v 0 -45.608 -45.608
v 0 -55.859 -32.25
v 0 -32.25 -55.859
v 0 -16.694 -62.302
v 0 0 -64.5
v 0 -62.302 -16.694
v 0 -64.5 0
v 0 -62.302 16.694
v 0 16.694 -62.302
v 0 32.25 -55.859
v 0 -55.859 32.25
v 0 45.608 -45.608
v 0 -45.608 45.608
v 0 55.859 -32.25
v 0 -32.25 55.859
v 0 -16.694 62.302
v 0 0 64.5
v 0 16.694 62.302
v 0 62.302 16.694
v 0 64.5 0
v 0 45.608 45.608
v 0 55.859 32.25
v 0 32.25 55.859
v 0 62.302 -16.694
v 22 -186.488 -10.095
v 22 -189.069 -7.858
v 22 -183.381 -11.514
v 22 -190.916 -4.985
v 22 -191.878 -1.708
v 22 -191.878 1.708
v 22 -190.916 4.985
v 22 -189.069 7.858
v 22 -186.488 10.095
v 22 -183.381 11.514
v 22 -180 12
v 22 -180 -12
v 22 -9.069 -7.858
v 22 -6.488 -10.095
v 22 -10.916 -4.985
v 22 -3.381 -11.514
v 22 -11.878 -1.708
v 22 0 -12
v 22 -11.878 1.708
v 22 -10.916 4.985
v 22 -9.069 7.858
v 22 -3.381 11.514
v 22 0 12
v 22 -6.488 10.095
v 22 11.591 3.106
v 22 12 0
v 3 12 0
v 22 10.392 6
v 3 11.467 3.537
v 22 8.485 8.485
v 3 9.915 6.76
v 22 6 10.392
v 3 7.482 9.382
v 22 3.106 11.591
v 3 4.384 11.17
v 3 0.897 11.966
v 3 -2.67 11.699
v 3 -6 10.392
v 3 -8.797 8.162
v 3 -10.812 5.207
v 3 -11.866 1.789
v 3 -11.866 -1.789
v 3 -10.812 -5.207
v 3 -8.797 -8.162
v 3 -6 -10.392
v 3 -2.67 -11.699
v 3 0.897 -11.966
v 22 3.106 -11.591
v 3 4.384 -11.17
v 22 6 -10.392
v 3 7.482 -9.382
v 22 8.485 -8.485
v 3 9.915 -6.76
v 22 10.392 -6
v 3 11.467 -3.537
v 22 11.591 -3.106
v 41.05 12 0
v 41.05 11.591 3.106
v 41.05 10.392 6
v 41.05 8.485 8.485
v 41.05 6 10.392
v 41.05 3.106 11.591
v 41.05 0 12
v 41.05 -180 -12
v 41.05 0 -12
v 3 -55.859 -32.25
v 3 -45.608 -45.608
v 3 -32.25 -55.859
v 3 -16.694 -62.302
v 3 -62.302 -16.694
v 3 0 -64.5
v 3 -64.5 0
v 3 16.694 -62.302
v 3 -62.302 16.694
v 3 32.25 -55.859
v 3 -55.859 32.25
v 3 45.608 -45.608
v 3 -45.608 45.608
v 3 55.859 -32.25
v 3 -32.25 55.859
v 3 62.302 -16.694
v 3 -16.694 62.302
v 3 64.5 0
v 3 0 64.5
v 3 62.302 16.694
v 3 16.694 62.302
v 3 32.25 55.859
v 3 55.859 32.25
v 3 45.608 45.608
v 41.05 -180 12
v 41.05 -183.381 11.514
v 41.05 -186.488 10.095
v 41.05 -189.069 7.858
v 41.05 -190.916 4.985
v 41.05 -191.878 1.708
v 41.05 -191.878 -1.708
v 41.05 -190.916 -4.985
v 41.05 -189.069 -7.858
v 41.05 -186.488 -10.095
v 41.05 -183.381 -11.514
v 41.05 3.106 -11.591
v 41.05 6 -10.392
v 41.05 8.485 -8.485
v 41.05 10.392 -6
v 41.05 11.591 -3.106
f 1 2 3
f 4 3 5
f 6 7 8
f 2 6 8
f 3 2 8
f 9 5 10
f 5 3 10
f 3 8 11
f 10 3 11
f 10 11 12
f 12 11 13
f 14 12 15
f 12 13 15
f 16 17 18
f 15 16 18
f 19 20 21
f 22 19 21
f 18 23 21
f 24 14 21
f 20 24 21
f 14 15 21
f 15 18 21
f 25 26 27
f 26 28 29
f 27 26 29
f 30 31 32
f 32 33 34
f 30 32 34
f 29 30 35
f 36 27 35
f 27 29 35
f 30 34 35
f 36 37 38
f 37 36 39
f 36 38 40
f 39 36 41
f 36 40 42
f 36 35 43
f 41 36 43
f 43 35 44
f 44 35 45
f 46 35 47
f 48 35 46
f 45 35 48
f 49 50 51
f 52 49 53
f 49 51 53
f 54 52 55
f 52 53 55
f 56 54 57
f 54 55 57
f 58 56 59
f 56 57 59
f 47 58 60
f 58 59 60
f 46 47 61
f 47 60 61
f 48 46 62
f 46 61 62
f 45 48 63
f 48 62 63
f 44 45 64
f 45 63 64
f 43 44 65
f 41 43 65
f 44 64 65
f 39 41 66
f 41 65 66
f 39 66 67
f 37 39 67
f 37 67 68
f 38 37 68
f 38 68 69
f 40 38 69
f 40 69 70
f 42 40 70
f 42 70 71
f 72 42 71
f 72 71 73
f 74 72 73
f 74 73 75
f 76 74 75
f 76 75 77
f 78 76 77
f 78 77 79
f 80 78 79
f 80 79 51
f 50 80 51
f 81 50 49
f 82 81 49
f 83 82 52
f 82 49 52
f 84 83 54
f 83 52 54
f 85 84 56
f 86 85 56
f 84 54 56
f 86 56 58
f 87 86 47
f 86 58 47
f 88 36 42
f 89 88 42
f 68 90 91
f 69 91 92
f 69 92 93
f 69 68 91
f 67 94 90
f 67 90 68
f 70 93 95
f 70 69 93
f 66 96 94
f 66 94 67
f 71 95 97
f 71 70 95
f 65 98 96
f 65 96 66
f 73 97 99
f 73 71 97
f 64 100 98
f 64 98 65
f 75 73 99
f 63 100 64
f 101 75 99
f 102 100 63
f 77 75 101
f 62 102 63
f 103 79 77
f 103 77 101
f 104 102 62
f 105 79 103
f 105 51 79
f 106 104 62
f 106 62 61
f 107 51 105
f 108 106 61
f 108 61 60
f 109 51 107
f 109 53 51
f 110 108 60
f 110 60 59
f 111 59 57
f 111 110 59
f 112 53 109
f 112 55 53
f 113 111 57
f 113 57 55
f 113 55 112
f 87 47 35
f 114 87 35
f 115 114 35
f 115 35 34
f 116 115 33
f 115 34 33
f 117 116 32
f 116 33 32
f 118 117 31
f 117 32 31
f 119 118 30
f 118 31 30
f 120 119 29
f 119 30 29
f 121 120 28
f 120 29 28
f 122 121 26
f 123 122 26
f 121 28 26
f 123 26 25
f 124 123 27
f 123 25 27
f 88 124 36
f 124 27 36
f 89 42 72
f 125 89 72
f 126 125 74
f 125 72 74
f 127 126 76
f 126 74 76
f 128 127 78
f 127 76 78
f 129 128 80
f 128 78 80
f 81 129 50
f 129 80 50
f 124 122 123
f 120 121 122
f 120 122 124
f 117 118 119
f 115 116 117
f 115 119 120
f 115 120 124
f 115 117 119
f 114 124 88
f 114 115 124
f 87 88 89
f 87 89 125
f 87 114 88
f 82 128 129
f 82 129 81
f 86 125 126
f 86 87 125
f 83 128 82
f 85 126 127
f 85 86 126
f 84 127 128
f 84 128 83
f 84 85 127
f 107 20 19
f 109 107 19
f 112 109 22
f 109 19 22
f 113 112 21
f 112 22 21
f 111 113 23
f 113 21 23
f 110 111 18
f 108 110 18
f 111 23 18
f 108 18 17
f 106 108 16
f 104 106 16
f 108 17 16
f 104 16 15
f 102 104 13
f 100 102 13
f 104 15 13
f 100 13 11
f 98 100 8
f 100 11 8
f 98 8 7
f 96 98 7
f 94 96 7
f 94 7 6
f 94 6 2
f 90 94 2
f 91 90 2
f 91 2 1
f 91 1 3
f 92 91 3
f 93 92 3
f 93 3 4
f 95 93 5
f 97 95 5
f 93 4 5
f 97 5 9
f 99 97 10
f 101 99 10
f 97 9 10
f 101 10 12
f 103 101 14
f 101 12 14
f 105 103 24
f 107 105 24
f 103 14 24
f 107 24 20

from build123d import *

# Parameters (mm, degrees)
F0_R     = 64.5
F1_DEPTH = 3
F2_R     = 12
F3_DEPTH = 19
F5_DEPTH = 19.05


with BuildPart() as f1:
    # F0 (on Right) → F1 (new body)
    with BuildSketch(Plane.YZ):
        Circle(F0_R)
    extrude(amount=F1_DEPTH)

    # F2 (on face) → F3 (join)
    with BuildSketch(Plane.YZ.offset(3)):
        Circle(F2_R)
    extrude(amount=F3_DEPTH)

    # F4 (on face) → F5 (join)
    with BuildSketch(Plane.YZ.offset(22)):
        with BuildLine():
            ThreePointArc((0, -12), (-12, 0), (0, 12))
            Line((0, 12), (-180, 12))
            ThreePointArc((-180, 12), (-192, 0), (-180, -12))
            Line((-180, -12), (0, -12))
        make_face()
        with BuildLine():
            ThreePointArc((12, 0), (8.485281, 8.485281), (0, 12))
            ThreePointArc((0, 12), (-12, 0), (0, -12))
            ThreePointArc((0, -12), (8.485281, -8.485281), (12, 0))
        make_face()
    extrude(amount=F5_DEPTH)


solid = f1.part
